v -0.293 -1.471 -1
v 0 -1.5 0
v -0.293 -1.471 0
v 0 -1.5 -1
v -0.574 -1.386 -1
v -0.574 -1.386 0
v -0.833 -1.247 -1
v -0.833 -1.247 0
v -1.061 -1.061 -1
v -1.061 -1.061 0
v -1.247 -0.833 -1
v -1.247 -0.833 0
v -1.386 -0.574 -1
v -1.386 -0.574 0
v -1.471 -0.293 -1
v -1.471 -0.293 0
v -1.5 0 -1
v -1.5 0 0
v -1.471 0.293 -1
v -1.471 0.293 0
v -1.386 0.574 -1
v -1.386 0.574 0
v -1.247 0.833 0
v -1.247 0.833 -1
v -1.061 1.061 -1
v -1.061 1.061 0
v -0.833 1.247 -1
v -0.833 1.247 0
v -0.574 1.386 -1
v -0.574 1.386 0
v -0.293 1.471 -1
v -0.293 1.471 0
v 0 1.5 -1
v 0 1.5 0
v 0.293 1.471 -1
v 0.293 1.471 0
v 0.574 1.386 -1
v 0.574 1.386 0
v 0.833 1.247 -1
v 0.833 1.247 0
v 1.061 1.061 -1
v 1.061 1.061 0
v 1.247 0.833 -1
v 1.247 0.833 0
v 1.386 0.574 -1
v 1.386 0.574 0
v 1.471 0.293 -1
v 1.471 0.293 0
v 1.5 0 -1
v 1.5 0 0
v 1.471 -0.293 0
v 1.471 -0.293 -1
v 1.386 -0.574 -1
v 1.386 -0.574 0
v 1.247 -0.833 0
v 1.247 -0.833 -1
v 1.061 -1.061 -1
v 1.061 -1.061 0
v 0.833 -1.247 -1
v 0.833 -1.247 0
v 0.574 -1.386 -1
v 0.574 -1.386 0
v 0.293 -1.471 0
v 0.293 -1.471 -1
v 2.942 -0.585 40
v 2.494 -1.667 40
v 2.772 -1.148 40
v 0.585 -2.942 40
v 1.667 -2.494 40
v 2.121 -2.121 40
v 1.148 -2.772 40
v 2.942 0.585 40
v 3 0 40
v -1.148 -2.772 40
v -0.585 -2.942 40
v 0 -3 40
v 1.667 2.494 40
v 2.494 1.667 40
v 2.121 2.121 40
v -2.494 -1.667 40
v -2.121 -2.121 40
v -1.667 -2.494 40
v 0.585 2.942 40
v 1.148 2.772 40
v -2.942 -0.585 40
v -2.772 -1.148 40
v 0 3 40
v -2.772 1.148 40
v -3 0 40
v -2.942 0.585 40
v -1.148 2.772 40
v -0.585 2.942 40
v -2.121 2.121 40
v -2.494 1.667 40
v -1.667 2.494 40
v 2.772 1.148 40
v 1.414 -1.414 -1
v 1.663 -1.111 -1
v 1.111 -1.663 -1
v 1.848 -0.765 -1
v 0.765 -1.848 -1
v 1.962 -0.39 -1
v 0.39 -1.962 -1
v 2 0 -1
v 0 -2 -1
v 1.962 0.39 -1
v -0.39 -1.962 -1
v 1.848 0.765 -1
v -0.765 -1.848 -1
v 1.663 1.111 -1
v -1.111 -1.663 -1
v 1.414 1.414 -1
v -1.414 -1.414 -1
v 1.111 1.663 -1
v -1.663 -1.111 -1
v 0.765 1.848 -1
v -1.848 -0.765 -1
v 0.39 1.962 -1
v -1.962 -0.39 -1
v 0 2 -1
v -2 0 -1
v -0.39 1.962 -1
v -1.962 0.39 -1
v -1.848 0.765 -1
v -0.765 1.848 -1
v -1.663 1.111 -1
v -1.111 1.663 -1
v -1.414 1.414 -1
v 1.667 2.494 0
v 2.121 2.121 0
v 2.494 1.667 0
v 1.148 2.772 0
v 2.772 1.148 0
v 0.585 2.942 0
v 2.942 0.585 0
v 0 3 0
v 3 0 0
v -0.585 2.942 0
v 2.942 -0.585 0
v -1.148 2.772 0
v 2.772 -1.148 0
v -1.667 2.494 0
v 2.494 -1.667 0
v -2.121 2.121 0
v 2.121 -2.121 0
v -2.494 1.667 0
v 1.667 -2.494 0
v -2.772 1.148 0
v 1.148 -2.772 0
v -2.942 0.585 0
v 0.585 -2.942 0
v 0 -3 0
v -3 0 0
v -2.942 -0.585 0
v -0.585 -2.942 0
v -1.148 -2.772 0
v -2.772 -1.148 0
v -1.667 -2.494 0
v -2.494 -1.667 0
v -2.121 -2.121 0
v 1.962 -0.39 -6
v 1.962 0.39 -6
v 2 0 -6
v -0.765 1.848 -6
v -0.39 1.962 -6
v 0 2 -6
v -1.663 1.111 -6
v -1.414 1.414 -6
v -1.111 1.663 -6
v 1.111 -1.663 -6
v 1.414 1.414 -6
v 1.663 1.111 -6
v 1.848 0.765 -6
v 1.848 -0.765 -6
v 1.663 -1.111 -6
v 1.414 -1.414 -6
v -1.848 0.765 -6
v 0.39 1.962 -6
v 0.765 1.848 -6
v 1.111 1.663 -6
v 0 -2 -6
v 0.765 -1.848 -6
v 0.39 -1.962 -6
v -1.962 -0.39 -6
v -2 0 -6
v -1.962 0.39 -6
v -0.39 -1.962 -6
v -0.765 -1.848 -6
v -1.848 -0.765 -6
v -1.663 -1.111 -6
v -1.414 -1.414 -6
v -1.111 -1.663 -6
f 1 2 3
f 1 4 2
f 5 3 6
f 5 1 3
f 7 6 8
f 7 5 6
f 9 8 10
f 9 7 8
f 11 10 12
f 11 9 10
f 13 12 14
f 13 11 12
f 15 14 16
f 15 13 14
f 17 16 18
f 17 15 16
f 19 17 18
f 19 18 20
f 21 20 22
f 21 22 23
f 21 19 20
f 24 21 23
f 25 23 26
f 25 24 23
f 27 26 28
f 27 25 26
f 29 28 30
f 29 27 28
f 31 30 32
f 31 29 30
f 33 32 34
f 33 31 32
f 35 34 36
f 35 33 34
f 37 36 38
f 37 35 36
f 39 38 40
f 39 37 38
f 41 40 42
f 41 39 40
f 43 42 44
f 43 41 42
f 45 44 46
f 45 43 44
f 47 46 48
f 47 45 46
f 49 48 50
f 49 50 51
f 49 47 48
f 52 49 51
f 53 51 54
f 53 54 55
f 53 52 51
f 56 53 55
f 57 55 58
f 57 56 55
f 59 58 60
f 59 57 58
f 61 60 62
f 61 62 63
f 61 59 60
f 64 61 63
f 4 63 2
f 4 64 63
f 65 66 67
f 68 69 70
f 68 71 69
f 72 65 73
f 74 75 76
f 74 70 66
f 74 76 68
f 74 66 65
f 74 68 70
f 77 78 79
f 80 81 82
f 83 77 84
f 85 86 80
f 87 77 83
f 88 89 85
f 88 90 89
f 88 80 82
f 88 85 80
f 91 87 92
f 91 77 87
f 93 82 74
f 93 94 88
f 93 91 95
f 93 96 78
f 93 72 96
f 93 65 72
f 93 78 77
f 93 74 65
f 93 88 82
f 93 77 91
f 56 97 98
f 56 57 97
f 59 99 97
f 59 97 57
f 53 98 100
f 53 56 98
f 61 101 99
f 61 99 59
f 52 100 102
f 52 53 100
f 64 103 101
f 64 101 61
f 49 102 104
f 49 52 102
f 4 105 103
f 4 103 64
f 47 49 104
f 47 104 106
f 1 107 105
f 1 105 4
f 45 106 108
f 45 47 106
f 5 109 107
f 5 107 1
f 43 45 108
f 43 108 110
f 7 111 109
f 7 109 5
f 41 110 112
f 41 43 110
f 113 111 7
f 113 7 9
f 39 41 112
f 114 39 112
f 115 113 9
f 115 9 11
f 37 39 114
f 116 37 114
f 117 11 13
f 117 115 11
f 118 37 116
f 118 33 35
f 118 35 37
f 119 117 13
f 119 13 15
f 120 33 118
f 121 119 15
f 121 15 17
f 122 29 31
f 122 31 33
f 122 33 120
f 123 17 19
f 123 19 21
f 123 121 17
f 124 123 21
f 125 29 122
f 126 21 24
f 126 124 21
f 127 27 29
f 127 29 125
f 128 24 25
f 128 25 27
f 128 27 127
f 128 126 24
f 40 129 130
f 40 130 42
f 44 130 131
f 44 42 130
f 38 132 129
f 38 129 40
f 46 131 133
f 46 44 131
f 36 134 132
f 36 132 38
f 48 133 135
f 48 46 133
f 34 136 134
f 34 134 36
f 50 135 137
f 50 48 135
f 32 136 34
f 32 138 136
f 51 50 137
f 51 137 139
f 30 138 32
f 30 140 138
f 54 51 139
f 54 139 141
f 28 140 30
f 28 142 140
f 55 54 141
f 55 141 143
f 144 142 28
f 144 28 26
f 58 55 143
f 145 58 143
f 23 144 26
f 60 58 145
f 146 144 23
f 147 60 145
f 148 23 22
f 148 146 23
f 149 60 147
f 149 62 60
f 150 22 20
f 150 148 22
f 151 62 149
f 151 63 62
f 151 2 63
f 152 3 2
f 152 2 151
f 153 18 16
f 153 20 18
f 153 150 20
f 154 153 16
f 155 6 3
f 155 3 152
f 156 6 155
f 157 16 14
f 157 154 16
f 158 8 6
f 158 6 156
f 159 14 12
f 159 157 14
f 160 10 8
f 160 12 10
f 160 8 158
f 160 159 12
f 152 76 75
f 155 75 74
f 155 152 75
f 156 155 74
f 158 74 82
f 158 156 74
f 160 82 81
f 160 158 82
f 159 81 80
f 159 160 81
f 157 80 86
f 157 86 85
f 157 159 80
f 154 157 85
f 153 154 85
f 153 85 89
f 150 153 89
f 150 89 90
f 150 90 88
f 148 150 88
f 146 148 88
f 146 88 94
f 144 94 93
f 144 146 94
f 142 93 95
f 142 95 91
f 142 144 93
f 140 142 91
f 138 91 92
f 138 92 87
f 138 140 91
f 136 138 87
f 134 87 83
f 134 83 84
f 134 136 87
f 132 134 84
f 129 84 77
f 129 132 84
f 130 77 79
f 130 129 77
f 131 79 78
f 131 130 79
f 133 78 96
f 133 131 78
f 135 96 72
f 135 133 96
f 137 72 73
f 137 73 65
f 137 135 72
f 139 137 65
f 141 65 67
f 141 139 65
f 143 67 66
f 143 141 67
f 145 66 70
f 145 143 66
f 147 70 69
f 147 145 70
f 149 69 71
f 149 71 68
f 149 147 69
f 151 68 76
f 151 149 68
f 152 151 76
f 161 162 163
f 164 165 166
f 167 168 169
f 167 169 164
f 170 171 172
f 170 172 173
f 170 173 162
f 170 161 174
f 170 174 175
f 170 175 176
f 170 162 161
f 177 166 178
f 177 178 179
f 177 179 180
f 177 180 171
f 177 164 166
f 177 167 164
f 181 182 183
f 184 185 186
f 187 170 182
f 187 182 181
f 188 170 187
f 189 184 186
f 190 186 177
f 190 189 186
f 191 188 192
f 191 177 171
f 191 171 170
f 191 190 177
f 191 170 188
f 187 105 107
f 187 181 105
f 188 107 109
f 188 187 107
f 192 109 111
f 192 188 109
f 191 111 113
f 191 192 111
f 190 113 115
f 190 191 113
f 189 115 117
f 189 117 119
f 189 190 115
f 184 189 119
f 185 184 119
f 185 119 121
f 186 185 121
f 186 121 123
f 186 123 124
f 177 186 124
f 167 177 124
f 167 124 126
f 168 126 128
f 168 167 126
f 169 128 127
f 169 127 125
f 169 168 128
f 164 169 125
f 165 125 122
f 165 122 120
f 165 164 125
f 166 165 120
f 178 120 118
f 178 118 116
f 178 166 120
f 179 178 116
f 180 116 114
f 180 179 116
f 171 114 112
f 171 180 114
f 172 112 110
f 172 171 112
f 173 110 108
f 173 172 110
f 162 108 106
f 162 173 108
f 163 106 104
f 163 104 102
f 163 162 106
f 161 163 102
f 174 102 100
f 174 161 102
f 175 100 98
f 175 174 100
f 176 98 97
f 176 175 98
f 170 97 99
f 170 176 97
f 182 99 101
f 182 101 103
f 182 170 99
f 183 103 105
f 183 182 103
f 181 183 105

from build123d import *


with BuildPart() as part:
    # Sketch1 → Revolve1 (revolve)
    with BuildSketch(Plane.XZ, mode=Mode.PRIVATE) as revolve1_sk:
        Polygon((0, 40), (3, 40), (3, 0), (1.5, 0), (1.5, -1), (2, -1), (2, -6), (0, -6), align=None)
    revolve(revolve1_sk.sketch.rotate(Axis((0, 0, 44.681241357), (0, 0, -1)), 90), axis=Axis((0, 0, 44.681241357), (0, 0, -1)))


solid = part.part
